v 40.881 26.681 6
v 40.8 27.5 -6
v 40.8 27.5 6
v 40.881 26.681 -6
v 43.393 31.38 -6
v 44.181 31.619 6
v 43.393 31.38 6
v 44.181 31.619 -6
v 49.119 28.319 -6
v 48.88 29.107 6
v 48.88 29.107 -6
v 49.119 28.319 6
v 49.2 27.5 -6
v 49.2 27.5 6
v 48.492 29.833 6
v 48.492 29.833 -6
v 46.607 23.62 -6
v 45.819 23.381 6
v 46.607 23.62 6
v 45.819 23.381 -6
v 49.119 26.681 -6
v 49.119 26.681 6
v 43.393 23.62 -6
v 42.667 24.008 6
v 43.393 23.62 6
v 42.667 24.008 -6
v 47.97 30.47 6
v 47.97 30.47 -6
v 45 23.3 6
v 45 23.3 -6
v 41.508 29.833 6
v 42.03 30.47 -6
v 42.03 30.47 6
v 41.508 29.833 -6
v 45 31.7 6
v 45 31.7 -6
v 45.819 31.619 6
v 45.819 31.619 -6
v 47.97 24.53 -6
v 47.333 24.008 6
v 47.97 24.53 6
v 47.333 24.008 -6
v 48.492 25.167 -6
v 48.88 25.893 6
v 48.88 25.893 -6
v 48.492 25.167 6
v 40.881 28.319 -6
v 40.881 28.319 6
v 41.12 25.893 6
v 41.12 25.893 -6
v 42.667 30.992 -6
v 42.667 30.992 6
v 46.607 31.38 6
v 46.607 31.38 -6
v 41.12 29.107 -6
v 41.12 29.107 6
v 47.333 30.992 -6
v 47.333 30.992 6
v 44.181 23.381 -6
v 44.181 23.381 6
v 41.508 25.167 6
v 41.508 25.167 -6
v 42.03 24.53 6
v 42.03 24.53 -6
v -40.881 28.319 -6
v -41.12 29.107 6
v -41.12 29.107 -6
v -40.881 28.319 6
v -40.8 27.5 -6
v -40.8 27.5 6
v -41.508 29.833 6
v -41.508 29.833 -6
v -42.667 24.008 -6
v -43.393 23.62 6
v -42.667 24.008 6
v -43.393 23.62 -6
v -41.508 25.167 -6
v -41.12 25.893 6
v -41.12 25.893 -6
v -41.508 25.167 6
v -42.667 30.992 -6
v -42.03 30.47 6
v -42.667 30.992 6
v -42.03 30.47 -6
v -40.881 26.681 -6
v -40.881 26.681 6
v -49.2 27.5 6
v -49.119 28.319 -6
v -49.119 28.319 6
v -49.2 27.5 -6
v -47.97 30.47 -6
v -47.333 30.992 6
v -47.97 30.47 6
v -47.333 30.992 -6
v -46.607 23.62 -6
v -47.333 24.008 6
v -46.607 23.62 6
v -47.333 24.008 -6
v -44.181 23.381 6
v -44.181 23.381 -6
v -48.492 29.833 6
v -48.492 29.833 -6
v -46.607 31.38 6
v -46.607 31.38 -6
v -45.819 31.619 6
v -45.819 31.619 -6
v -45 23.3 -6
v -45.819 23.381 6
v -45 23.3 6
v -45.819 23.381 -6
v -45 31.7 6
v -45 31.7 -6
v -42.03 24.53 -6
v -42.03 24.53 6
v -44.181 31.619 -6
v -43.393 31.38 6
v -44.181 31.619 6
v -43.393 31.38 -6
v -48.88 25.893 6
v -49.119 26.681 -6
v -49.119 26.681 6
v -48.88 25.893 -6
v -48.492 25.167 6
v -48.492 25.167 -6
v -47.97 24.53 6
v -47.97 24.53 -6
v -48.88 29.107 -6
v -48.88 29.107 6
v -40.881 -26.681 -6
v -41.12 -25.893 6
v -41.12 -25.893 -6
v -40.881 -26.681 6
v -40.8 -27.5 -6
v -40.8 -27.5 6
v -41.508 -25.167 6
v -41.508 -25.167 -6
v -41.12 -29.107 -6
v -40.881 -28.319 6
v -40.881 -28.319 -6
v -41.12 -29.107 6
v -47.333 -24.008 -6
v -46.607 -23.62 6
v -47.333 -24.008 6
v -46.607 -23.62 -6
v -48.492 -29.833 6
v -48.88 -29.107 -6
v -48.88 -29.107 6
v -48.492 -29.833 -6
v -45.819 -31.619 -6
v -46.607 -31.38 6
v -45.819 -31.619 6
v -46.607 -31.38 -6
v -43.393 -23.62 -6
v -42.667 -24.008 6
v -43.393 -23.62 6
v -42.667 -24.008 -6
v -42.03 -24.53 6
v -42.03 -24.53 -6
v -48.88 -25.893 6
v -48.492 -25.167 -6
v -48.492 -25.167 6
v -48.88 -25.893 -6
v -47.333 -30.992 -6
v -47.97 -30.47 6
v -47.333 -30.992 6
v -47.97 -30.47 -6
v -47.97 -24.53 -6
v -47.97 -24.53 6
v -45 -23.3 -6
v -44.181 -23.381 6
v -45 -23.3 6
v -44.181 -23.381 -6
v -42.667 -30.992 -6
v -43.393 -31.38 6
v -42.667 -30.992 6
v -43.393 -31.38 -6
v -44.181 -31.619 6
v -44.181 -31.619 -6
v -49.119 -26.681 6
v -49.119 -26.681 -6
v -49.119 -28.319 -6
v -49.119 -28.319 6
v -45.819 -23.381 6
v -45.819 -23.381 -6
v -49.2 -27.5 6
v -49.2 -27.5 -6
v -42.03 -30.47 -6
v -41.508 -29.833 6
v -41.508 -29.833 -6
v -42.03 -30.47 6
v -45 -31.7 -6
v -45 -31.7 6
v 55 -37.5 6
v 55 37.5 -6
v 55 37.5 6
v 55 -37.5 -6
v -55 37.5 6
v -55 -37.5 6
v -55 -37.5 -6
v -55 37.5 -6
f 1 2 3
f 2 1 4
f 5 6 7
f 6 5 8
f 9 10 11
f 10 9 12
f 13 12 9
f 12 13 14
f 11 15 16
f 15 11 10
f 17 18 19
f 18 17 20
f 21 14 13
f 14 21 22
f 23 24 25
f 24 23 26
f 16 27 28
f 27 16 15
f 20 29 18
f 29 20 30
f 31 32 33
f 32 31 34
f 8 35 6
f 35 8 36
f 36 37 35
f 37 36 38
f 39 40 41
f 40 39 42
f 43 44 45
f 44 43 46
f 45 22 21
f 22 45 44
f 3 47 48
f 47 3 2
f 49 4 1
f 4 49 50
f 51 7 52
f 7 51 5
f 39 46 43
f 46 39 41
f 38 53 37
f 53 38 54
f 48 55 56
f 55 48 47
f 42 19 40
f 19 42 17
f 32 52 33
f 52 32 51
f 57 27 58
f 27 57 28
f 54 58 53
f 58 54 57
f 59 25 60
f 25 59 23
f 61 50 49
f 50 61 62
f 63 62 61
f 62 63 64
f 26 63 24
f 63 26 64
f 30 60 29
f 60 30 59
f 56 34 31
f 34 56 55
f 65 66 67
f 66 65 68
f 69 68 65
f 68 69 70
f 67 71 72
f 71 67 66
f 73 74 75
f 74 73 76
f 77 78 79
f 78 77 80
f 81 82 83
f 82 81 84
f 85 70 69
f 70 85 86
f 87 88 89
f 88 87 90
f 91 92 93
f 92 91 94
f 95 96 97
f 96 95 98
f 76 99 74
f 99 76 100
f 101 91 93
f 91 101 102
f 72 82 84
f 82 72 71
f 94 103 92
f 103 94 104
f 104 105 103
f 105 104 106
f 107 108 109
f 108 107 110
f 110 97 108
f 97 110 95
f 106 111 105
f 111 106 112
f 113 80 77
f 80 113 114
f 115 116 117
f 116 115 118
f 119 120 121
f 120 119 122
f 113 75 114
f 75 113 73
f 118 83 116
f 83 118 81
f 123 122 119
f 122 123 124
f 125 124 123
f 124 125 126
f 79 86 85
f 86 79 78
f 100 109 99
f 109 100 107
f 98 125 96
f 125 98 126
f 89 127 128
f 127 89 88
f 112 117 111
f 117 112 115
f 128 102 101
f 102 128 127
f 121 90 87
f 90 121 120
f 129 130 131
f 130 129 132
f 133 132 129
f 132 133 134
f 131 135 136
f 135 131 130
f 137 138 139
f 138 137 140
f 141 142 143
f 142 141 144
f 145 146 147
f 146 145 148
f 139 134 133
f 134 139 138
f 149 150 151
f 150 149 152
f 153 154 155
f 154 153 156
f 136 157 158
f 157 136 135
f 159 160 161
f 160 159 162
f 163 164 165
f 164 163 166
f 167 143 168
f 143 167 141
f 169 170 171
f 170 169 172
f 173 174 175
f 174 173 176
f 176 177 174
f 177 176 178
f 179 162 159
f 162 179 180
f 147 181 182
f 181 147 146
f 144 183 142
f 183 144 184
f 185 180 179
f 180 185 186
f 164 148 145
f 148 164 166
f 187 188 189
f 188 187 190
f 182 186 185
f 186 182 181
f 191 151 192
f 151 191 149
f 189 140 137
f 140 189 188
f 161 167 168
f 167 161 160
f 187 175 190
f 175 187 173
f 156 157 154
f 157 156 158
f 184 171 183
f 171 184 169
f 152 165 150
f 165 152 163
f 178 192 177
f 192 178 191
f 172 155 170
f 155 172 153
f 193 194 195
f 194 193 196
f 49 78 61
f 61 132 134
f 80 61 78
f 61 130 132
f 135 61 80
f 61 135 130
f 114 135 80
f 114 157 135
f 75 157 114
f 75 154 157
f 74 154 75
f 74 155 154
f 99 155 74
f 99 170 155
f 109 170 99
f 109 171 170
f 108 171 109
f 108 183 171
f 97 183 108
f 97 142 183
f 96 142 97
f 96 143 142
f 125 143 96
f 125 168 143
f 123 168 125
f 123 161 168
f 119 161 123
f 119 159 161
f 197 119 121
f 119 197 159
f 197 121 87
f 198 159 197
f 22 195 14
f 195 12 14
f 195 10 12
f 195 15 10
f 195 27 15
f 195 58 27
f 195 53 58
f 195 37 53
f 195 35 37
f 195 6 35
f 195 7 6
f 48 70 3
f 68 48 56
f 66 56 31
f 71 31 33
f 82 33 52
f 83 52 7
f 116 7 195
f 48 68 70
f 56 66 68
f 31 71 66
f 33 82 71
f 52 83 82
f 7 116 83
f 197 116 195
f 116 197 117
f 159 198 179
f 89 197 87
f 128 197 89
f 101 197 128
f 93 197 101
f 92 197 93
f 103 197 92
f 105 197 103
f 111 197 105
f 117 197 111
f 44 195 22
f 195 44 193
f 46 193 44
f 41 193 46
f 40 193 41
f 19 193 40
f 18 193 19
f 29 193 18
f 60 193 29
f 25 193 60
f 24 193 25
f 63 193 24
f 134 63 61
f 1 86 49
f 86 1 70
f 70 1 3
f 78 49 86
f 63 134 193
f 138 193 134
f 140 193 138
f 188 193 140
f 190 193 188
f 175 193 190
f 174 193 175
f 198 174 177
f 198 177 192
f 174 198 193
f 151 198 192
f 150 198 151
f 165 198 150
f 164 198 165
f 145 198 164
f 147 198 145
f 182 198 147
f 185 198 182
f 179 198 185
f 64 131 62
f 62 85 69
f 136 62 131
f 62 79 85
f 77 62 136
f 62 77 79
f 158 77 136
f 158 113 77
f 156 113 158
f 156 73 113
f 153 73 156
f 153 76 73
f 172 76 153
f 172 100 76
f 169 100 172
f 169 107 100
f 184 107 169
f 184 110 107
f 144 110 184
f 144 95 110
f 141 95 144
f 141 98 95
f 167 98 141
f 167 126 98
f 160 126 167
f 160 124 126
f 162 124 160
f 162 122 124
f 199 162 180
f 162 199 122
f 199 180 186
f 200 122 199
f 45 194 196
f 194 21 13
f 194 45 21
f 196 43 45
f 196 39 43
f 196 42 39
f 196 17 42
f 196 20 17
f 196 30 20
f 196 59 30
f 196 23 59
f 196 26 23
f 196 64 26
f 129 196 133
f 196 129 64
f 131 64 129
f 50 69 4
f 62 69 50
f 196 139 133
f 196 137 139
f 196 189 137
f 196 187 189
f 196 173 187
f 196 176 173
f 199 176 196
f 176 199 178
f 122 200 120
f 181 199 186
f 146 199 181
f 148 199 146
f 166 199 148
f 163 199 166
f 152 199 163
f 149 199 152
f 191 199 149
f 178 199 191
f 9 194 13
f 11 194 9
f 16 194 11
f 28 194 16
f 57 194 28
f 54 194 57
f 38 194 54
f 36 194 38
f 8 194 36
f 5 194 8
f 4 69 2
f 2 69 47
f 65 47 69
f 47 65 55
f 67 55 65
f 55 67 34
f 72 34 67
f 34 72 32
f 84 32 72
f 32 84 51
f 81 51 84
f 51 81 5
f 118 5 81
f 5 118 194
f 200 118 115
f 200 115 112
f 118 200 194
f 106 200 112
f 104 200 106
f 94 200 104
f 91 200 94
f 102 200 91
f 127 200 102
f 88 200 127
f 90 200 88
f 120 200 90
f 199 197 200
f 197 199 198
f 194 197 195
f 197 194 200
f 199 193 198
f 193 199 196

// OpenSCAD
$fn = 32;

// ----------------------------------------------------------------------
// Corner plate 110 x 75 x 12
// 3 holes, centres taken from the edge offset
// ----------------------------------------------------------------------

// --- parameters (mm) ---
plate = [110, 75, 12];  // overall size (x, y, z)
holes = 3;              // number of holes the drawing asks for
hole_d = 8.4;           // hole diameter
edge = 10;              // hole centre offset from the plate edge

// --- derived feature positions (mm) ---
corner_x = plate[0] / 2 - edge;  // = 45   corner hole X
corner_y = plate[1] / 2 - edge;  // = 27.5   corner hole Y
feature_centers = [
  [corner_x, corner_y],
  [-corner_x, corner_y],
  [-corner_x, -corner_y]
];   // hole centres the loop below drills

// plate outline, every hole drilled through with the same cutters
difference() {
  cube(plate, center = true);
  for (centre = feature_centers)
    translate([centre[0], centre[1], 0])
      cylinder(d = hole_d, h = plate[2] + 2, center = true);
}
